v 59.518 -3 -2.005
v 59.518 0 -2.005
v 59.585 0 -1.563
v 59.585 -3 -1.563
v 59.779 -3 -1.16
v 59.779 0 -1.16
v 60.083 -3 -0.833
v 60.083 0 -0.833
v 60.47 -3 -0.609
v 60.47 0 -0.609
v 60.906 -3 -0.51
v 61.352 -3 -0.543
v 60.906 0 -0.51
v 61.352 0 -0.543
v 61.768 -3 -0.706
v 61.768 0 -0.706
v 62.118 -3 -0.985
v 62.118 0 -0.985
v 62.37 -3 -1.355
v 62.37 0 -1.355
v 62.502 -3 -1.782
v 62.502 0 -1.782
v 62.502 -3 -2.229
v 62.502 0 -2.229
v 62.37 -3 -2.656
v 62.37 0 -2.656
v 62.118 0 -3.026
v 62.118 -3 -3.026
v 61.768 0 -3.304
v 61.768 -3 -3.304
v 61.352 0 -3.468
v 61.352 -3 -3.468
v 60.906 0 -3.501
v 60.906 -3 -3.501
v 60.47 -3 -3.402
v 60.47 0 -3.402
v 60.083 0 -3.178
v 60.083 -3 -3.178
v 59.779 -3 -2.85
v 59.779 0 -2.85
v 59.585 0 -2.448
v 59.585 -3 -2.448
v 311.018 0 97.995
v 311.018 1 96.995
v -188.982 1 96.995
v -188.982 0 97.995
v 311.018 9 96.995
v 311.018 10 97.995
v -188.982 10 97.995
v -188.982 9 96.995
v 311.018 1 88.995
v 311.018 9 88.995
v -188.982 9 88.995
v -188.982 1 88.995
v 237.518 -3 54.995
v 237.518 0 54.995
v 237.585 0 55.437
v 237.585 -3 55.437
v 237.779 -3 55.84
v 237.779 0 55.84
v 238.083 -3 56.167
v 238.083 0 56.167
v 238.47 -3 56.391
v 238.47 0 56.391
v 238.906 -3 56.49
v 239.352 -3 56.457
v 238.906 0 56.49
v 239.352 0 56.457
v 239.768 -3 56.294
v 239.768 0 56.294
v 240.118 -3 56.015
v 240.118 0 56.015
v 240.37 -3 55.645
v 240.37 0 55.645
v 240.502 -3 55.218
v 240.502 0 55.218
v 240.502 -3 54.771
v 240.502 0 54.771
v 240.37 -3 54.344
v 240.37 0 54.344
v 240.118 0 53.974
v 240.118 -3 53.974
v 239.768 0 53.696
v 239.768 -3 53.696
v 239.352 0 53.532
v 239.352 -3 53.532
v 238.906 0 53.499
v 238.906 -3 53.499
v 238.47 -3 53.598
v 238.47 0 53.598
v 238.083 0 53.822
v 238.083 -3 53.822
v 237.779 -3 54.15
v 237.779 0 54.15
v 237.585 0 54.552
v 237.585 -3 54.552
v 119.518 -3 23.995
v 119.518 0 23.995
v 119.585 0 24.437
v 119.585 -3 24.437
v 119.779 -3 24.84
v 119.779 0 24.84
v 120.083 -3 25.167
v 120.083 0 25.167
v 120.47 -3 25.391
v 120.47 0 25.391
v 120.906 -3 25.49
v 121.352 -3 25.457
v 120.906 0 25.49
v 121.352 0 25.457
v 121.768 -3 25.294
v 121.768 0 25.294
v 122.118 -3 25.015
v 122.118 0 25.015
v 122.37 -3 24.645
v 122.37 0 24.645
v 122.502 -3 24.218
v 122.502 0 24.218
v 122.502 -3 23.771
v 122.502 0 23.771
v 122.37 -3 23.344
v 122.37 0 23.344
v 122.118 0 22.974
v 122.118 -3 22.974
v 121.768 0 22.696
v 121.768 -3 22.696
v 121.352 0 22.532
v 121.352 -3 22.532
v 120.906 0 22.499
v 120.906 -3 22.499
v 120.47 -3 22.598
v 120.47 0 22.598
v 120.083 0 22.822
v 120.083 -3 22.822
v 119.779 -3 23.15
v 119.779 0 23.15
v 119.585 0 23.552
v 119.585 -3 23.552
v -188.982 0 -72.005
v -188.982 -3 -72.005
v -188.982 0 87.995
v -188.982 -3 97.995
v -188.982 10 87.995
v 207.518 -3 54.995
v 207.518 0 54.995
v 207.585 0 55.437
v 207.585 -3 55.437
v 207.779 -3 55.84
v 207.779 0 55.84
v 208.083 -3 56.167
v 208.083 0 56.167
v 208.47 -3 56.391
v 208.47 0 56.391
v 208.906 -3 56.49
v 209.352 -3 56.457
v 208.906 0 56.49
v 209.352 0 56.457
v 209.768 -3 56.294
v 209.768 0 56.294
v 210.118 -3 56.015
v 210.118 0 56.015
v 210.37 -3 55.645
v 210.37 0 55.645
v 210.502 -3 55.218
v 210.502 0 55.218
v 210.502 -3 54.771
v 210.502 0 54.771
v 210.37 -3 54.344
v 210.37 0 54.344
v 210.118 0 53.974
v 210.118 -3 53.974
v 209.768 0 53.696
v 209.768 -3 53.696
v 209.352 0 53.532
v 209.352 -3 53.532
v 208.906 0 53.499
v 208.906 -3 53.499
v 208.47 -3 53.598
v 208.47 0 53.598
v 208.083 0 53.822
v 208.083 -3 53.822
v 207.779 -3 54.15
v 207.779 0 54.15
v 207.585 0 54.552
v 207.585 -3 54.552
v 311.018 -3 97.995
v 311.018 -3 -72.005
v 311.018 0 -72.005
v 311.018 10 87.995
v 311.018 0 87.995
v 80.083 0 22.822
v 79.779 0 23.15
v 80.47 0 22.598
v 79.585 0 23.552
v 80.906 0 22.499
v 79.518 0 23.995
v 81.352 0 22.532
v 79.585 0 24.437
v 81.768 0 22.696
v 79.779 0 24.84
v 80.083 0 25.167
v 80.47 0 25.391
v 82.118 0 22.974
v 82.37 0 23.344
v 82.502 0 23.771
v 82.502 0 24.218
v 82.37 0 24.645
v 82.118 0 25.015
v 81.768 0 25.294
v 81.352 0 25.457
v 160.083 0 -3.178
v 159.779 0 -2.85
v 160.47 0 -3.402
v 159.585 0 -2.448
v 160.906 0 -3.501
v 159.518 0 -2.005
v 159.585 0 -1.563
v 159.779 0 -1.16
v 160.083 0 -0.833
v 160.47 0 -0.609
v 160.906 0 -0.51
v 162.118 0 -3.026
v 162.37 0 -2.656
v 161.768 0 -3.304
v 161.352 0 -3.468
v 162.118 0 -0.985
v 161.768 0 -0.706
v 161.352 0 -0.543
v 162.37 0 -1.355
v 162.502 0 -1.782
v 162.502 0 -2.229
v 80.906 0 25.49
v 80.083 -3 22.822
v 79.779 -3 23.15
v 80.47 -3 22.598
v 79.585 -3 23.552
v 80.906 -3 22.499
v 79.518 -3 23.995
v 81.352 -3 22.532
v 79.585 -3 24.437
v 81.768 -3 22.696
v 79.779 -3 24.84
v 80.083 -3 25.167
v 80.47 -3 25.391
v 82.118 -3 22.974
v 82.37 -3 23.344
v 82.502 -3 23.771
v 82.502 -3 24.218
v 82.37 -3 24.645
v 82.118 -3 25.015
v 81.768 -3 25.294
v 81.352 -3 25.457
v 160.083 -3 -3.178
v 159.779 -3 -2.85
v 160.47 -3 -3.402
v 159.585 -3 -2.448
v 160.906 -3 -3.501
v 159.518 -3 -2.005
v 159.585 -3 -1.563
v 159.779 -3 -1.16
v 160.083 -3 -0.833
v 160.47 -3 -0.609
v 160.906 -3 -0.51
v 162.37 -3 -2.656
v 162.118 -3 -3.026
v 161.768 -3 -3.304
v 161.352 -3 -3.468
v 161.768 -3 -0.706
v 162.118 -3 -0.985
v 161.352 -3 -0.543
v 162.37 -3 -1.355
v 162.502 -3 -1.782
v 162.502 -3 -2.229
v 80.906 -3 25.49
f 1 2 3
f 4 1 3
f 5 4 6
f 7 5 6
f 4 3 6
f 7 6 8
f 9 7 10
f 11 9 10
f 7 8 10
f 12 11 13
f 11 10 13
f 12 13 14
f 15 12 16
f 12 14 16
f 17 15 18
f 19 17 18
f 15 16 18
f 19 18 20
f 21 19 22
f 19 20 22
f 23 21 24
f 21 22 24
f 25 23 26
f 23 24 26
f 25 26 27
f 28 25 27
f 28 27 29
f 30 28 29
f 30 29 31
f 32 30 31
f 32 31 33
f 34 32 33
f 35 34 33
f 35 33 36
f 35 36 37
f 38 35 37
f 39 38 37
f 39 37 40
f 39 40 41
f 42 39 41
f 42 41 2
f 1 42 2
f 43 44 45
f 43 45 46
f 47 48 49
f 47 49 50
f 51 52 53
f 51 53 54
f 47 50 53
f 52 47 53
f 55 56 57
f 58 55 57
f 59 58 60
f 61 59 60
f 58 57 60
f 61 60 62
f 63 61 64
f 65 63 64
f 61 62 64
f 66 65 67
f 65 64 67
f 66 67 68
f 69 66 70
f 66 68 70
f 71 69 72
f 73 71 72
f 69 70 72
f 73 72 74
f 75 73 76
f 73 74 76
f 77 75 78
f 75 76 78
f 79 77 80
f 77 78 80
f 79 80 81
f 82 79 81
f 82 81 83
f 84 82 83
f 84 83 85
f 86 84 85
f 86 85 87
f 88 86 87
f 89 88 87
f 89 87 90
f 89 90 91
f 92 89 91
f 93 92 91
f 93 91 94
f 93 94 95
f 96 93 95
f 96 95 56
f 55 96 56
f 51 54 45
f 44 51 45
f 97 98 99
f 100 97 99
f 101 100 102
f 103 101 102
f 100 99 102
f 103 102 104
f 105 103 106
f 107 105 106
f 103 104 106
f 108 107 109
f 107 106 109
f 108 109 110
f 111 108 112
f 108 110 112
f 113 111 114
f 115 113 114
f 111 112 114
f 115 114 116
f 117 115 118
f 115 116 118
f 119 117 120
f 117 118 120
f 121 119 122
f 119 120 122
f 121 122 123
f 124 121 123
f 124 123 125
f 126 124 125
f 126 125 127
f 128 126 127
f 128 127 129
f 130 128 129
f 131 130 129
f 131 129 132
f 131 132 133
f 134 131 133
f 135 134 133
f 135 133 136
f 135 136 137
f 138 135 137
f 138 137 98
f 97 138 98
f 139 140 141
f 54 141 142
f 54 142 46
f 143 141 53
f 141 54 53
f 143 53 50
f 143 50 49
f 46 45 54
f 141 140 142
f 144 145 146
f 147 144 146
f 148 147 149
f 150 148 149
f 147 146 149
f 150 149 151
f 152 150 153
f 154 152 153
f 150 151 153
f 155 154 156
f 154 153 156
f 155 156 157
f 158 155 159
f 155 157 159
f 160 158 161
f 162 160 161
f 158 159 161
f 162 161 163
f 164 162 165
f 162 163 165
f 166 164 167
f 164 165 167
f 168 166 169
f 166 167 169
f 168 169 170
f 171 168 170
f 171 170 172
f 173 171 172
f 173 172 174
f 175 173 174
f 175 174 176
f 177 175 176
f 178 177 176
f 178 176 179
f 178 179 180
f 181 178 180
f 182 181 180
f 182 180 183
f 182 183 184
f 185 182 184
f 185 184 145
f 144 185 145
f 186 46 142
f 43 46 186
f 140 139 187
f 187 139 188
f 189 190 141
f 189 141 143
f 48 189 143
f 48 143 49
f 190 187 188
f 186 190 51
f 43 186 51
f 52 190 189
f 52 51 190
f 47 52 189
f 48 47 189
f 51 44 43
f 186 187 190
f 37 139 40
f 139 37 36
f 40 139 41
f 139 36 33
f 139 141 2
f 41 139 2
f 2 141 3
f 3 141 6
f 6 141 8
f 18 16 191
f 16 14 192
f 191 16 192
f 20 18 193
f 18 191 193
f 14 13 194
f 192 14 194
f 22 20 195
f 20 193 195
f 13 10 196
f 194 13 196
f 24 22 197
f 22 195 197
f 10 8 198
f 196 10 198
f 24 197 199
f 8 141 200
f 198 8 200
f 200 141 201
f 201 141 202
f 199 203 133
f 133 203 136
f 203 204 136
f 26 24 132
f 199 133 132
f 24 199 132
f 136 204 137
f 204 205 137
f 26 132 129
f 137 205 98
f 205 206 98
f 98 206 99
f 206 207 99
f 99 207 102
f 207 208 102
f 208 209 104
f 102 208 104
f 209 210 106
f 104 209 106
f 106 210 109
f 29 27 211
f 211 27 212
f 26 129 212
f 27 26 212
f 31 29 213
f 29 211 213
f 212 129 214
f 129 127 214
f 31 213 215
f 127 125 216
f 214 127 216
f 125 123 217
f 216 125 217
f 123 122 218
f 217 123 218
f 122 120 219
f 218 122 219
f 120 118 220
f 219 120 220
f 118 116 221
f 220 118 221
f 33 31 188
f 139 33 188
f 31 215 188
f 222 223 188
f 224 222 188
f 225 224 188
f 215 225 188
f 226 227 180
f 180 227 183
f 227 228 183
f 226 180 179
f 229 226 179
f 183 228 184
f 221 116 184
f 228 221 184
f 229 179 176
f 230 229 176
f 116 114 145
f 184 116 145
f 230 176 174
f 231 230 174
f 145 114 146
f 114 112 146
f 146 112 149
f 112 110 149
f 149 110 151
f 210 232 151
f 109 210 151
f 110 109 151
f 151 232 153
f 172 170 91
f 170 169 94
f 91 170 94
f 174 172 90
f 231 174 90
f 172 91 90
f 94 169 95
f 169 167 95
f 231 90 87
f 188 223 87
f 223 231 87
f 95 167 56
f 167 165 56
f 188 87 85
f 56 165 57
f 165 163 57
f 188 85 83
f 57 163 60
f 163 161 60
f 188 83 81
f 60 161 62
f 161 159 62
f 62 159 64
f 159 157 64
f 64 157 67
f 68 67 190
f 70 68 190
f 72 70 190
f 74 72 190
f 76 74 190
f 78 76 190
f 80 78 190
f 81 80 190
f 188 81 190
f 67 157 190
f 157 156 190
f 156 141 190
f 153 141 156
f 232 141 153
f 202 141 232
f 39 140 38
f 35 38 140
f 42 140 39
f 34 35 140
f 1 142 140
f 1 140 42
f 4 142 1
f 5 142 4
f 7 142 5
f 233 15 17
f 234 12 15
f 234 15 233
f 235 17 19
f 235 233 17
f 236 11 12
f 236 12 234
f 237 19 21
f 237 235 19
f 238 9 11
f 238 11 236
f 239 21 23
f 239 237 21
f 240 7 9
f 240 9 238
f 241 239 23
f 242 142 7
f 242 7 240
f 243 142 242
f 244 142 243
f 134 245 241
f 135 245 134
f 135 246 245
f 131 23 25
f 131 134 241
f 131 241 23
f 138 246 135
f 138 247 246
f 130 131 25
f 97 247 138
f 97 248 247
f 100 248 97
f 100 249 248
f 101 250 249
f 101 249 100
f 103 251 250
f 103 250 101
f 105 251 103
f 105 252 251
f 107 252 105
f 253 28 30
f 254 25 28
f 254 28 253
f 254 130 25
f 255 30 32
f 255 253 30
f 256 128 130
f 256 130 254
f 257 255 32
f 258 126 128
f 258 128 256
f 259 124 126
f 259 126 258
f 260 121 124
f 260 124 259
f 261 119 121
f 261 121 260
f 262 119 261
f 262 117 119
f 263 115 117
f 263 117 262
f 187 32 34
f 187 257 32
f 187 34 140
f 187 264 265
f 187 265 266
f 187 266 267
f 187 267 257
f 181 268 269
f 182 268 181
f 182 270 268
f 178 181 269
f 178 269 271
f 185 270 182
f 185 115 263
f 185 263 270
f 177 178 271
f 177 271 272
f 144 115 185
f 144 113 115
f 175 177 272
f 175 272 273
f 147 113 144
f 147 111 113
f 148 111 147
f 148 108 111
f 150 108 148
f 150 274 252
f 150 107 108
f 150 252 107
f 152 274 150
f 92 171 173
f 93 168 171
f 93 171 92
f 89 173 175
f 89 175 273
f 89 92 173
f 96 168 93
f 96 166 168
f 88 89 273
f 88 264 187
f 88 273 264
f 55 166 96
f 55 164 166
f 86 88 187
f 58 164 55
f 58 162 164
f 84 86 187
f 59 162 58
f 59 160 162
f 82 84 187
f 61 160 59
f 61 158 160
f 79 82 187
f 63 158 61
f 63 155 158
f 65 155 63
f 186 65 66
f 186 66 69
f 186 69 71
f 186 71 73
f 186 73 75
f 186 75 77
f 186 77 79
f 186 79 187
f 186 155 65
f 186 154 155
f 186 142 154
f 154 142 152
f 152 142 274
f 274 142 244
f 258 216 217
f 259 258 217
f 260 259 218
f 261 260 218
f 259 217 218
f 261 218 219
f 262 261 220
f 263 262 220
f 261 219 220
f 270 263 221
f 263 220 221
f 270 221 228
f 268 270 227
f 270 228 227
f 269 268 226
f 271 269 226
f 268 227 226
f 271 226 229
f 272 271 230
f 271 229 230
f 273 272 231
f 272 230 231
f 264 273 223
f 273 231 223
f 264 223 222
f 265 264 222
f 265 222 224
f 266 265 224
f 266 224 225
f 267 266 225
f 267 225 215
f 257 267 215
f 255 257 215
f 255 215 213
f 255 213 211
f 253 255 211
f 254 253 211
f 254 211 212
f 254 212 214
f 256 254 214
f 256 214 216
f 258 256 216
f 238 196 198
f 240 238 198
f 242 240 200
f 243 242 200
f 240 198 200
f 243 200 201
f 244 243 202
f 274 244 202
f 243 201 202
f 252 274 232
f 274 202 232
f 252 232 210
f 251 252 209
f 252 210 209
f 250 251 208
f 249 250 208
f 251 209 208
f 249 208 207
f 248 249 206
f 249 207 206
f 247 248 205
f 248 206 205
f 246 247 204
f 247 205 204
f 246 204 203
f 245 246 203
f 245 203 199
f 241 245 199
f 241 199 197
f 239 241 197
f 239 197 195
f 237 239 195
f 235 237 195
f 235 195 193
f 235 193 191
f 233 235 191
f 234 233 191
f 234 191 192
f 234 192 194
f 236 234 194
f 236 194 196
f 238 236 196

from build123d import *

# Parameters (mm, degrees)
F0_W     = 500
F0_H     = 170
F1_DEPTH = 3
F3_DEPTH = 500
F5_D     = 3
F5_DEPTH = 25


with BuildPart() as f1:
    # F0 (on Front) → F1 (new body)
    with BuildSketch(Plane.XZ):
        with Locations((61.018479, 12.994566)):
            Rectangle(F0_W, F0_H)
    extrude(amount=F1_DEPTH)

    # F2 (on face) → F3 (join, through all)
    with BuildSketch(Plane.YZ.offset(311.018479)):
        Polygon((0, 97.994566), (0, 87.994566), (10, 87.994566), (10, 97.994566), (9, 96.994566), (9, 88.994566), (1, 88.994566), (1, 96.994566), align=None)
    extrude(amount=-F3_DEPTH)

    # F5
    with Locations(Plane.XZ.offset(3)):
        with Locations((61.018479, -2.005434), (81.018479, 23.994566), (121.018479, 23.994566), (161.018479, -2.005434), (209.018479, 54.994566), (239.018479, 54.994566)):
            Hole(F5_D / 2, depth=F5_DEPTH)


solid = f1.part
